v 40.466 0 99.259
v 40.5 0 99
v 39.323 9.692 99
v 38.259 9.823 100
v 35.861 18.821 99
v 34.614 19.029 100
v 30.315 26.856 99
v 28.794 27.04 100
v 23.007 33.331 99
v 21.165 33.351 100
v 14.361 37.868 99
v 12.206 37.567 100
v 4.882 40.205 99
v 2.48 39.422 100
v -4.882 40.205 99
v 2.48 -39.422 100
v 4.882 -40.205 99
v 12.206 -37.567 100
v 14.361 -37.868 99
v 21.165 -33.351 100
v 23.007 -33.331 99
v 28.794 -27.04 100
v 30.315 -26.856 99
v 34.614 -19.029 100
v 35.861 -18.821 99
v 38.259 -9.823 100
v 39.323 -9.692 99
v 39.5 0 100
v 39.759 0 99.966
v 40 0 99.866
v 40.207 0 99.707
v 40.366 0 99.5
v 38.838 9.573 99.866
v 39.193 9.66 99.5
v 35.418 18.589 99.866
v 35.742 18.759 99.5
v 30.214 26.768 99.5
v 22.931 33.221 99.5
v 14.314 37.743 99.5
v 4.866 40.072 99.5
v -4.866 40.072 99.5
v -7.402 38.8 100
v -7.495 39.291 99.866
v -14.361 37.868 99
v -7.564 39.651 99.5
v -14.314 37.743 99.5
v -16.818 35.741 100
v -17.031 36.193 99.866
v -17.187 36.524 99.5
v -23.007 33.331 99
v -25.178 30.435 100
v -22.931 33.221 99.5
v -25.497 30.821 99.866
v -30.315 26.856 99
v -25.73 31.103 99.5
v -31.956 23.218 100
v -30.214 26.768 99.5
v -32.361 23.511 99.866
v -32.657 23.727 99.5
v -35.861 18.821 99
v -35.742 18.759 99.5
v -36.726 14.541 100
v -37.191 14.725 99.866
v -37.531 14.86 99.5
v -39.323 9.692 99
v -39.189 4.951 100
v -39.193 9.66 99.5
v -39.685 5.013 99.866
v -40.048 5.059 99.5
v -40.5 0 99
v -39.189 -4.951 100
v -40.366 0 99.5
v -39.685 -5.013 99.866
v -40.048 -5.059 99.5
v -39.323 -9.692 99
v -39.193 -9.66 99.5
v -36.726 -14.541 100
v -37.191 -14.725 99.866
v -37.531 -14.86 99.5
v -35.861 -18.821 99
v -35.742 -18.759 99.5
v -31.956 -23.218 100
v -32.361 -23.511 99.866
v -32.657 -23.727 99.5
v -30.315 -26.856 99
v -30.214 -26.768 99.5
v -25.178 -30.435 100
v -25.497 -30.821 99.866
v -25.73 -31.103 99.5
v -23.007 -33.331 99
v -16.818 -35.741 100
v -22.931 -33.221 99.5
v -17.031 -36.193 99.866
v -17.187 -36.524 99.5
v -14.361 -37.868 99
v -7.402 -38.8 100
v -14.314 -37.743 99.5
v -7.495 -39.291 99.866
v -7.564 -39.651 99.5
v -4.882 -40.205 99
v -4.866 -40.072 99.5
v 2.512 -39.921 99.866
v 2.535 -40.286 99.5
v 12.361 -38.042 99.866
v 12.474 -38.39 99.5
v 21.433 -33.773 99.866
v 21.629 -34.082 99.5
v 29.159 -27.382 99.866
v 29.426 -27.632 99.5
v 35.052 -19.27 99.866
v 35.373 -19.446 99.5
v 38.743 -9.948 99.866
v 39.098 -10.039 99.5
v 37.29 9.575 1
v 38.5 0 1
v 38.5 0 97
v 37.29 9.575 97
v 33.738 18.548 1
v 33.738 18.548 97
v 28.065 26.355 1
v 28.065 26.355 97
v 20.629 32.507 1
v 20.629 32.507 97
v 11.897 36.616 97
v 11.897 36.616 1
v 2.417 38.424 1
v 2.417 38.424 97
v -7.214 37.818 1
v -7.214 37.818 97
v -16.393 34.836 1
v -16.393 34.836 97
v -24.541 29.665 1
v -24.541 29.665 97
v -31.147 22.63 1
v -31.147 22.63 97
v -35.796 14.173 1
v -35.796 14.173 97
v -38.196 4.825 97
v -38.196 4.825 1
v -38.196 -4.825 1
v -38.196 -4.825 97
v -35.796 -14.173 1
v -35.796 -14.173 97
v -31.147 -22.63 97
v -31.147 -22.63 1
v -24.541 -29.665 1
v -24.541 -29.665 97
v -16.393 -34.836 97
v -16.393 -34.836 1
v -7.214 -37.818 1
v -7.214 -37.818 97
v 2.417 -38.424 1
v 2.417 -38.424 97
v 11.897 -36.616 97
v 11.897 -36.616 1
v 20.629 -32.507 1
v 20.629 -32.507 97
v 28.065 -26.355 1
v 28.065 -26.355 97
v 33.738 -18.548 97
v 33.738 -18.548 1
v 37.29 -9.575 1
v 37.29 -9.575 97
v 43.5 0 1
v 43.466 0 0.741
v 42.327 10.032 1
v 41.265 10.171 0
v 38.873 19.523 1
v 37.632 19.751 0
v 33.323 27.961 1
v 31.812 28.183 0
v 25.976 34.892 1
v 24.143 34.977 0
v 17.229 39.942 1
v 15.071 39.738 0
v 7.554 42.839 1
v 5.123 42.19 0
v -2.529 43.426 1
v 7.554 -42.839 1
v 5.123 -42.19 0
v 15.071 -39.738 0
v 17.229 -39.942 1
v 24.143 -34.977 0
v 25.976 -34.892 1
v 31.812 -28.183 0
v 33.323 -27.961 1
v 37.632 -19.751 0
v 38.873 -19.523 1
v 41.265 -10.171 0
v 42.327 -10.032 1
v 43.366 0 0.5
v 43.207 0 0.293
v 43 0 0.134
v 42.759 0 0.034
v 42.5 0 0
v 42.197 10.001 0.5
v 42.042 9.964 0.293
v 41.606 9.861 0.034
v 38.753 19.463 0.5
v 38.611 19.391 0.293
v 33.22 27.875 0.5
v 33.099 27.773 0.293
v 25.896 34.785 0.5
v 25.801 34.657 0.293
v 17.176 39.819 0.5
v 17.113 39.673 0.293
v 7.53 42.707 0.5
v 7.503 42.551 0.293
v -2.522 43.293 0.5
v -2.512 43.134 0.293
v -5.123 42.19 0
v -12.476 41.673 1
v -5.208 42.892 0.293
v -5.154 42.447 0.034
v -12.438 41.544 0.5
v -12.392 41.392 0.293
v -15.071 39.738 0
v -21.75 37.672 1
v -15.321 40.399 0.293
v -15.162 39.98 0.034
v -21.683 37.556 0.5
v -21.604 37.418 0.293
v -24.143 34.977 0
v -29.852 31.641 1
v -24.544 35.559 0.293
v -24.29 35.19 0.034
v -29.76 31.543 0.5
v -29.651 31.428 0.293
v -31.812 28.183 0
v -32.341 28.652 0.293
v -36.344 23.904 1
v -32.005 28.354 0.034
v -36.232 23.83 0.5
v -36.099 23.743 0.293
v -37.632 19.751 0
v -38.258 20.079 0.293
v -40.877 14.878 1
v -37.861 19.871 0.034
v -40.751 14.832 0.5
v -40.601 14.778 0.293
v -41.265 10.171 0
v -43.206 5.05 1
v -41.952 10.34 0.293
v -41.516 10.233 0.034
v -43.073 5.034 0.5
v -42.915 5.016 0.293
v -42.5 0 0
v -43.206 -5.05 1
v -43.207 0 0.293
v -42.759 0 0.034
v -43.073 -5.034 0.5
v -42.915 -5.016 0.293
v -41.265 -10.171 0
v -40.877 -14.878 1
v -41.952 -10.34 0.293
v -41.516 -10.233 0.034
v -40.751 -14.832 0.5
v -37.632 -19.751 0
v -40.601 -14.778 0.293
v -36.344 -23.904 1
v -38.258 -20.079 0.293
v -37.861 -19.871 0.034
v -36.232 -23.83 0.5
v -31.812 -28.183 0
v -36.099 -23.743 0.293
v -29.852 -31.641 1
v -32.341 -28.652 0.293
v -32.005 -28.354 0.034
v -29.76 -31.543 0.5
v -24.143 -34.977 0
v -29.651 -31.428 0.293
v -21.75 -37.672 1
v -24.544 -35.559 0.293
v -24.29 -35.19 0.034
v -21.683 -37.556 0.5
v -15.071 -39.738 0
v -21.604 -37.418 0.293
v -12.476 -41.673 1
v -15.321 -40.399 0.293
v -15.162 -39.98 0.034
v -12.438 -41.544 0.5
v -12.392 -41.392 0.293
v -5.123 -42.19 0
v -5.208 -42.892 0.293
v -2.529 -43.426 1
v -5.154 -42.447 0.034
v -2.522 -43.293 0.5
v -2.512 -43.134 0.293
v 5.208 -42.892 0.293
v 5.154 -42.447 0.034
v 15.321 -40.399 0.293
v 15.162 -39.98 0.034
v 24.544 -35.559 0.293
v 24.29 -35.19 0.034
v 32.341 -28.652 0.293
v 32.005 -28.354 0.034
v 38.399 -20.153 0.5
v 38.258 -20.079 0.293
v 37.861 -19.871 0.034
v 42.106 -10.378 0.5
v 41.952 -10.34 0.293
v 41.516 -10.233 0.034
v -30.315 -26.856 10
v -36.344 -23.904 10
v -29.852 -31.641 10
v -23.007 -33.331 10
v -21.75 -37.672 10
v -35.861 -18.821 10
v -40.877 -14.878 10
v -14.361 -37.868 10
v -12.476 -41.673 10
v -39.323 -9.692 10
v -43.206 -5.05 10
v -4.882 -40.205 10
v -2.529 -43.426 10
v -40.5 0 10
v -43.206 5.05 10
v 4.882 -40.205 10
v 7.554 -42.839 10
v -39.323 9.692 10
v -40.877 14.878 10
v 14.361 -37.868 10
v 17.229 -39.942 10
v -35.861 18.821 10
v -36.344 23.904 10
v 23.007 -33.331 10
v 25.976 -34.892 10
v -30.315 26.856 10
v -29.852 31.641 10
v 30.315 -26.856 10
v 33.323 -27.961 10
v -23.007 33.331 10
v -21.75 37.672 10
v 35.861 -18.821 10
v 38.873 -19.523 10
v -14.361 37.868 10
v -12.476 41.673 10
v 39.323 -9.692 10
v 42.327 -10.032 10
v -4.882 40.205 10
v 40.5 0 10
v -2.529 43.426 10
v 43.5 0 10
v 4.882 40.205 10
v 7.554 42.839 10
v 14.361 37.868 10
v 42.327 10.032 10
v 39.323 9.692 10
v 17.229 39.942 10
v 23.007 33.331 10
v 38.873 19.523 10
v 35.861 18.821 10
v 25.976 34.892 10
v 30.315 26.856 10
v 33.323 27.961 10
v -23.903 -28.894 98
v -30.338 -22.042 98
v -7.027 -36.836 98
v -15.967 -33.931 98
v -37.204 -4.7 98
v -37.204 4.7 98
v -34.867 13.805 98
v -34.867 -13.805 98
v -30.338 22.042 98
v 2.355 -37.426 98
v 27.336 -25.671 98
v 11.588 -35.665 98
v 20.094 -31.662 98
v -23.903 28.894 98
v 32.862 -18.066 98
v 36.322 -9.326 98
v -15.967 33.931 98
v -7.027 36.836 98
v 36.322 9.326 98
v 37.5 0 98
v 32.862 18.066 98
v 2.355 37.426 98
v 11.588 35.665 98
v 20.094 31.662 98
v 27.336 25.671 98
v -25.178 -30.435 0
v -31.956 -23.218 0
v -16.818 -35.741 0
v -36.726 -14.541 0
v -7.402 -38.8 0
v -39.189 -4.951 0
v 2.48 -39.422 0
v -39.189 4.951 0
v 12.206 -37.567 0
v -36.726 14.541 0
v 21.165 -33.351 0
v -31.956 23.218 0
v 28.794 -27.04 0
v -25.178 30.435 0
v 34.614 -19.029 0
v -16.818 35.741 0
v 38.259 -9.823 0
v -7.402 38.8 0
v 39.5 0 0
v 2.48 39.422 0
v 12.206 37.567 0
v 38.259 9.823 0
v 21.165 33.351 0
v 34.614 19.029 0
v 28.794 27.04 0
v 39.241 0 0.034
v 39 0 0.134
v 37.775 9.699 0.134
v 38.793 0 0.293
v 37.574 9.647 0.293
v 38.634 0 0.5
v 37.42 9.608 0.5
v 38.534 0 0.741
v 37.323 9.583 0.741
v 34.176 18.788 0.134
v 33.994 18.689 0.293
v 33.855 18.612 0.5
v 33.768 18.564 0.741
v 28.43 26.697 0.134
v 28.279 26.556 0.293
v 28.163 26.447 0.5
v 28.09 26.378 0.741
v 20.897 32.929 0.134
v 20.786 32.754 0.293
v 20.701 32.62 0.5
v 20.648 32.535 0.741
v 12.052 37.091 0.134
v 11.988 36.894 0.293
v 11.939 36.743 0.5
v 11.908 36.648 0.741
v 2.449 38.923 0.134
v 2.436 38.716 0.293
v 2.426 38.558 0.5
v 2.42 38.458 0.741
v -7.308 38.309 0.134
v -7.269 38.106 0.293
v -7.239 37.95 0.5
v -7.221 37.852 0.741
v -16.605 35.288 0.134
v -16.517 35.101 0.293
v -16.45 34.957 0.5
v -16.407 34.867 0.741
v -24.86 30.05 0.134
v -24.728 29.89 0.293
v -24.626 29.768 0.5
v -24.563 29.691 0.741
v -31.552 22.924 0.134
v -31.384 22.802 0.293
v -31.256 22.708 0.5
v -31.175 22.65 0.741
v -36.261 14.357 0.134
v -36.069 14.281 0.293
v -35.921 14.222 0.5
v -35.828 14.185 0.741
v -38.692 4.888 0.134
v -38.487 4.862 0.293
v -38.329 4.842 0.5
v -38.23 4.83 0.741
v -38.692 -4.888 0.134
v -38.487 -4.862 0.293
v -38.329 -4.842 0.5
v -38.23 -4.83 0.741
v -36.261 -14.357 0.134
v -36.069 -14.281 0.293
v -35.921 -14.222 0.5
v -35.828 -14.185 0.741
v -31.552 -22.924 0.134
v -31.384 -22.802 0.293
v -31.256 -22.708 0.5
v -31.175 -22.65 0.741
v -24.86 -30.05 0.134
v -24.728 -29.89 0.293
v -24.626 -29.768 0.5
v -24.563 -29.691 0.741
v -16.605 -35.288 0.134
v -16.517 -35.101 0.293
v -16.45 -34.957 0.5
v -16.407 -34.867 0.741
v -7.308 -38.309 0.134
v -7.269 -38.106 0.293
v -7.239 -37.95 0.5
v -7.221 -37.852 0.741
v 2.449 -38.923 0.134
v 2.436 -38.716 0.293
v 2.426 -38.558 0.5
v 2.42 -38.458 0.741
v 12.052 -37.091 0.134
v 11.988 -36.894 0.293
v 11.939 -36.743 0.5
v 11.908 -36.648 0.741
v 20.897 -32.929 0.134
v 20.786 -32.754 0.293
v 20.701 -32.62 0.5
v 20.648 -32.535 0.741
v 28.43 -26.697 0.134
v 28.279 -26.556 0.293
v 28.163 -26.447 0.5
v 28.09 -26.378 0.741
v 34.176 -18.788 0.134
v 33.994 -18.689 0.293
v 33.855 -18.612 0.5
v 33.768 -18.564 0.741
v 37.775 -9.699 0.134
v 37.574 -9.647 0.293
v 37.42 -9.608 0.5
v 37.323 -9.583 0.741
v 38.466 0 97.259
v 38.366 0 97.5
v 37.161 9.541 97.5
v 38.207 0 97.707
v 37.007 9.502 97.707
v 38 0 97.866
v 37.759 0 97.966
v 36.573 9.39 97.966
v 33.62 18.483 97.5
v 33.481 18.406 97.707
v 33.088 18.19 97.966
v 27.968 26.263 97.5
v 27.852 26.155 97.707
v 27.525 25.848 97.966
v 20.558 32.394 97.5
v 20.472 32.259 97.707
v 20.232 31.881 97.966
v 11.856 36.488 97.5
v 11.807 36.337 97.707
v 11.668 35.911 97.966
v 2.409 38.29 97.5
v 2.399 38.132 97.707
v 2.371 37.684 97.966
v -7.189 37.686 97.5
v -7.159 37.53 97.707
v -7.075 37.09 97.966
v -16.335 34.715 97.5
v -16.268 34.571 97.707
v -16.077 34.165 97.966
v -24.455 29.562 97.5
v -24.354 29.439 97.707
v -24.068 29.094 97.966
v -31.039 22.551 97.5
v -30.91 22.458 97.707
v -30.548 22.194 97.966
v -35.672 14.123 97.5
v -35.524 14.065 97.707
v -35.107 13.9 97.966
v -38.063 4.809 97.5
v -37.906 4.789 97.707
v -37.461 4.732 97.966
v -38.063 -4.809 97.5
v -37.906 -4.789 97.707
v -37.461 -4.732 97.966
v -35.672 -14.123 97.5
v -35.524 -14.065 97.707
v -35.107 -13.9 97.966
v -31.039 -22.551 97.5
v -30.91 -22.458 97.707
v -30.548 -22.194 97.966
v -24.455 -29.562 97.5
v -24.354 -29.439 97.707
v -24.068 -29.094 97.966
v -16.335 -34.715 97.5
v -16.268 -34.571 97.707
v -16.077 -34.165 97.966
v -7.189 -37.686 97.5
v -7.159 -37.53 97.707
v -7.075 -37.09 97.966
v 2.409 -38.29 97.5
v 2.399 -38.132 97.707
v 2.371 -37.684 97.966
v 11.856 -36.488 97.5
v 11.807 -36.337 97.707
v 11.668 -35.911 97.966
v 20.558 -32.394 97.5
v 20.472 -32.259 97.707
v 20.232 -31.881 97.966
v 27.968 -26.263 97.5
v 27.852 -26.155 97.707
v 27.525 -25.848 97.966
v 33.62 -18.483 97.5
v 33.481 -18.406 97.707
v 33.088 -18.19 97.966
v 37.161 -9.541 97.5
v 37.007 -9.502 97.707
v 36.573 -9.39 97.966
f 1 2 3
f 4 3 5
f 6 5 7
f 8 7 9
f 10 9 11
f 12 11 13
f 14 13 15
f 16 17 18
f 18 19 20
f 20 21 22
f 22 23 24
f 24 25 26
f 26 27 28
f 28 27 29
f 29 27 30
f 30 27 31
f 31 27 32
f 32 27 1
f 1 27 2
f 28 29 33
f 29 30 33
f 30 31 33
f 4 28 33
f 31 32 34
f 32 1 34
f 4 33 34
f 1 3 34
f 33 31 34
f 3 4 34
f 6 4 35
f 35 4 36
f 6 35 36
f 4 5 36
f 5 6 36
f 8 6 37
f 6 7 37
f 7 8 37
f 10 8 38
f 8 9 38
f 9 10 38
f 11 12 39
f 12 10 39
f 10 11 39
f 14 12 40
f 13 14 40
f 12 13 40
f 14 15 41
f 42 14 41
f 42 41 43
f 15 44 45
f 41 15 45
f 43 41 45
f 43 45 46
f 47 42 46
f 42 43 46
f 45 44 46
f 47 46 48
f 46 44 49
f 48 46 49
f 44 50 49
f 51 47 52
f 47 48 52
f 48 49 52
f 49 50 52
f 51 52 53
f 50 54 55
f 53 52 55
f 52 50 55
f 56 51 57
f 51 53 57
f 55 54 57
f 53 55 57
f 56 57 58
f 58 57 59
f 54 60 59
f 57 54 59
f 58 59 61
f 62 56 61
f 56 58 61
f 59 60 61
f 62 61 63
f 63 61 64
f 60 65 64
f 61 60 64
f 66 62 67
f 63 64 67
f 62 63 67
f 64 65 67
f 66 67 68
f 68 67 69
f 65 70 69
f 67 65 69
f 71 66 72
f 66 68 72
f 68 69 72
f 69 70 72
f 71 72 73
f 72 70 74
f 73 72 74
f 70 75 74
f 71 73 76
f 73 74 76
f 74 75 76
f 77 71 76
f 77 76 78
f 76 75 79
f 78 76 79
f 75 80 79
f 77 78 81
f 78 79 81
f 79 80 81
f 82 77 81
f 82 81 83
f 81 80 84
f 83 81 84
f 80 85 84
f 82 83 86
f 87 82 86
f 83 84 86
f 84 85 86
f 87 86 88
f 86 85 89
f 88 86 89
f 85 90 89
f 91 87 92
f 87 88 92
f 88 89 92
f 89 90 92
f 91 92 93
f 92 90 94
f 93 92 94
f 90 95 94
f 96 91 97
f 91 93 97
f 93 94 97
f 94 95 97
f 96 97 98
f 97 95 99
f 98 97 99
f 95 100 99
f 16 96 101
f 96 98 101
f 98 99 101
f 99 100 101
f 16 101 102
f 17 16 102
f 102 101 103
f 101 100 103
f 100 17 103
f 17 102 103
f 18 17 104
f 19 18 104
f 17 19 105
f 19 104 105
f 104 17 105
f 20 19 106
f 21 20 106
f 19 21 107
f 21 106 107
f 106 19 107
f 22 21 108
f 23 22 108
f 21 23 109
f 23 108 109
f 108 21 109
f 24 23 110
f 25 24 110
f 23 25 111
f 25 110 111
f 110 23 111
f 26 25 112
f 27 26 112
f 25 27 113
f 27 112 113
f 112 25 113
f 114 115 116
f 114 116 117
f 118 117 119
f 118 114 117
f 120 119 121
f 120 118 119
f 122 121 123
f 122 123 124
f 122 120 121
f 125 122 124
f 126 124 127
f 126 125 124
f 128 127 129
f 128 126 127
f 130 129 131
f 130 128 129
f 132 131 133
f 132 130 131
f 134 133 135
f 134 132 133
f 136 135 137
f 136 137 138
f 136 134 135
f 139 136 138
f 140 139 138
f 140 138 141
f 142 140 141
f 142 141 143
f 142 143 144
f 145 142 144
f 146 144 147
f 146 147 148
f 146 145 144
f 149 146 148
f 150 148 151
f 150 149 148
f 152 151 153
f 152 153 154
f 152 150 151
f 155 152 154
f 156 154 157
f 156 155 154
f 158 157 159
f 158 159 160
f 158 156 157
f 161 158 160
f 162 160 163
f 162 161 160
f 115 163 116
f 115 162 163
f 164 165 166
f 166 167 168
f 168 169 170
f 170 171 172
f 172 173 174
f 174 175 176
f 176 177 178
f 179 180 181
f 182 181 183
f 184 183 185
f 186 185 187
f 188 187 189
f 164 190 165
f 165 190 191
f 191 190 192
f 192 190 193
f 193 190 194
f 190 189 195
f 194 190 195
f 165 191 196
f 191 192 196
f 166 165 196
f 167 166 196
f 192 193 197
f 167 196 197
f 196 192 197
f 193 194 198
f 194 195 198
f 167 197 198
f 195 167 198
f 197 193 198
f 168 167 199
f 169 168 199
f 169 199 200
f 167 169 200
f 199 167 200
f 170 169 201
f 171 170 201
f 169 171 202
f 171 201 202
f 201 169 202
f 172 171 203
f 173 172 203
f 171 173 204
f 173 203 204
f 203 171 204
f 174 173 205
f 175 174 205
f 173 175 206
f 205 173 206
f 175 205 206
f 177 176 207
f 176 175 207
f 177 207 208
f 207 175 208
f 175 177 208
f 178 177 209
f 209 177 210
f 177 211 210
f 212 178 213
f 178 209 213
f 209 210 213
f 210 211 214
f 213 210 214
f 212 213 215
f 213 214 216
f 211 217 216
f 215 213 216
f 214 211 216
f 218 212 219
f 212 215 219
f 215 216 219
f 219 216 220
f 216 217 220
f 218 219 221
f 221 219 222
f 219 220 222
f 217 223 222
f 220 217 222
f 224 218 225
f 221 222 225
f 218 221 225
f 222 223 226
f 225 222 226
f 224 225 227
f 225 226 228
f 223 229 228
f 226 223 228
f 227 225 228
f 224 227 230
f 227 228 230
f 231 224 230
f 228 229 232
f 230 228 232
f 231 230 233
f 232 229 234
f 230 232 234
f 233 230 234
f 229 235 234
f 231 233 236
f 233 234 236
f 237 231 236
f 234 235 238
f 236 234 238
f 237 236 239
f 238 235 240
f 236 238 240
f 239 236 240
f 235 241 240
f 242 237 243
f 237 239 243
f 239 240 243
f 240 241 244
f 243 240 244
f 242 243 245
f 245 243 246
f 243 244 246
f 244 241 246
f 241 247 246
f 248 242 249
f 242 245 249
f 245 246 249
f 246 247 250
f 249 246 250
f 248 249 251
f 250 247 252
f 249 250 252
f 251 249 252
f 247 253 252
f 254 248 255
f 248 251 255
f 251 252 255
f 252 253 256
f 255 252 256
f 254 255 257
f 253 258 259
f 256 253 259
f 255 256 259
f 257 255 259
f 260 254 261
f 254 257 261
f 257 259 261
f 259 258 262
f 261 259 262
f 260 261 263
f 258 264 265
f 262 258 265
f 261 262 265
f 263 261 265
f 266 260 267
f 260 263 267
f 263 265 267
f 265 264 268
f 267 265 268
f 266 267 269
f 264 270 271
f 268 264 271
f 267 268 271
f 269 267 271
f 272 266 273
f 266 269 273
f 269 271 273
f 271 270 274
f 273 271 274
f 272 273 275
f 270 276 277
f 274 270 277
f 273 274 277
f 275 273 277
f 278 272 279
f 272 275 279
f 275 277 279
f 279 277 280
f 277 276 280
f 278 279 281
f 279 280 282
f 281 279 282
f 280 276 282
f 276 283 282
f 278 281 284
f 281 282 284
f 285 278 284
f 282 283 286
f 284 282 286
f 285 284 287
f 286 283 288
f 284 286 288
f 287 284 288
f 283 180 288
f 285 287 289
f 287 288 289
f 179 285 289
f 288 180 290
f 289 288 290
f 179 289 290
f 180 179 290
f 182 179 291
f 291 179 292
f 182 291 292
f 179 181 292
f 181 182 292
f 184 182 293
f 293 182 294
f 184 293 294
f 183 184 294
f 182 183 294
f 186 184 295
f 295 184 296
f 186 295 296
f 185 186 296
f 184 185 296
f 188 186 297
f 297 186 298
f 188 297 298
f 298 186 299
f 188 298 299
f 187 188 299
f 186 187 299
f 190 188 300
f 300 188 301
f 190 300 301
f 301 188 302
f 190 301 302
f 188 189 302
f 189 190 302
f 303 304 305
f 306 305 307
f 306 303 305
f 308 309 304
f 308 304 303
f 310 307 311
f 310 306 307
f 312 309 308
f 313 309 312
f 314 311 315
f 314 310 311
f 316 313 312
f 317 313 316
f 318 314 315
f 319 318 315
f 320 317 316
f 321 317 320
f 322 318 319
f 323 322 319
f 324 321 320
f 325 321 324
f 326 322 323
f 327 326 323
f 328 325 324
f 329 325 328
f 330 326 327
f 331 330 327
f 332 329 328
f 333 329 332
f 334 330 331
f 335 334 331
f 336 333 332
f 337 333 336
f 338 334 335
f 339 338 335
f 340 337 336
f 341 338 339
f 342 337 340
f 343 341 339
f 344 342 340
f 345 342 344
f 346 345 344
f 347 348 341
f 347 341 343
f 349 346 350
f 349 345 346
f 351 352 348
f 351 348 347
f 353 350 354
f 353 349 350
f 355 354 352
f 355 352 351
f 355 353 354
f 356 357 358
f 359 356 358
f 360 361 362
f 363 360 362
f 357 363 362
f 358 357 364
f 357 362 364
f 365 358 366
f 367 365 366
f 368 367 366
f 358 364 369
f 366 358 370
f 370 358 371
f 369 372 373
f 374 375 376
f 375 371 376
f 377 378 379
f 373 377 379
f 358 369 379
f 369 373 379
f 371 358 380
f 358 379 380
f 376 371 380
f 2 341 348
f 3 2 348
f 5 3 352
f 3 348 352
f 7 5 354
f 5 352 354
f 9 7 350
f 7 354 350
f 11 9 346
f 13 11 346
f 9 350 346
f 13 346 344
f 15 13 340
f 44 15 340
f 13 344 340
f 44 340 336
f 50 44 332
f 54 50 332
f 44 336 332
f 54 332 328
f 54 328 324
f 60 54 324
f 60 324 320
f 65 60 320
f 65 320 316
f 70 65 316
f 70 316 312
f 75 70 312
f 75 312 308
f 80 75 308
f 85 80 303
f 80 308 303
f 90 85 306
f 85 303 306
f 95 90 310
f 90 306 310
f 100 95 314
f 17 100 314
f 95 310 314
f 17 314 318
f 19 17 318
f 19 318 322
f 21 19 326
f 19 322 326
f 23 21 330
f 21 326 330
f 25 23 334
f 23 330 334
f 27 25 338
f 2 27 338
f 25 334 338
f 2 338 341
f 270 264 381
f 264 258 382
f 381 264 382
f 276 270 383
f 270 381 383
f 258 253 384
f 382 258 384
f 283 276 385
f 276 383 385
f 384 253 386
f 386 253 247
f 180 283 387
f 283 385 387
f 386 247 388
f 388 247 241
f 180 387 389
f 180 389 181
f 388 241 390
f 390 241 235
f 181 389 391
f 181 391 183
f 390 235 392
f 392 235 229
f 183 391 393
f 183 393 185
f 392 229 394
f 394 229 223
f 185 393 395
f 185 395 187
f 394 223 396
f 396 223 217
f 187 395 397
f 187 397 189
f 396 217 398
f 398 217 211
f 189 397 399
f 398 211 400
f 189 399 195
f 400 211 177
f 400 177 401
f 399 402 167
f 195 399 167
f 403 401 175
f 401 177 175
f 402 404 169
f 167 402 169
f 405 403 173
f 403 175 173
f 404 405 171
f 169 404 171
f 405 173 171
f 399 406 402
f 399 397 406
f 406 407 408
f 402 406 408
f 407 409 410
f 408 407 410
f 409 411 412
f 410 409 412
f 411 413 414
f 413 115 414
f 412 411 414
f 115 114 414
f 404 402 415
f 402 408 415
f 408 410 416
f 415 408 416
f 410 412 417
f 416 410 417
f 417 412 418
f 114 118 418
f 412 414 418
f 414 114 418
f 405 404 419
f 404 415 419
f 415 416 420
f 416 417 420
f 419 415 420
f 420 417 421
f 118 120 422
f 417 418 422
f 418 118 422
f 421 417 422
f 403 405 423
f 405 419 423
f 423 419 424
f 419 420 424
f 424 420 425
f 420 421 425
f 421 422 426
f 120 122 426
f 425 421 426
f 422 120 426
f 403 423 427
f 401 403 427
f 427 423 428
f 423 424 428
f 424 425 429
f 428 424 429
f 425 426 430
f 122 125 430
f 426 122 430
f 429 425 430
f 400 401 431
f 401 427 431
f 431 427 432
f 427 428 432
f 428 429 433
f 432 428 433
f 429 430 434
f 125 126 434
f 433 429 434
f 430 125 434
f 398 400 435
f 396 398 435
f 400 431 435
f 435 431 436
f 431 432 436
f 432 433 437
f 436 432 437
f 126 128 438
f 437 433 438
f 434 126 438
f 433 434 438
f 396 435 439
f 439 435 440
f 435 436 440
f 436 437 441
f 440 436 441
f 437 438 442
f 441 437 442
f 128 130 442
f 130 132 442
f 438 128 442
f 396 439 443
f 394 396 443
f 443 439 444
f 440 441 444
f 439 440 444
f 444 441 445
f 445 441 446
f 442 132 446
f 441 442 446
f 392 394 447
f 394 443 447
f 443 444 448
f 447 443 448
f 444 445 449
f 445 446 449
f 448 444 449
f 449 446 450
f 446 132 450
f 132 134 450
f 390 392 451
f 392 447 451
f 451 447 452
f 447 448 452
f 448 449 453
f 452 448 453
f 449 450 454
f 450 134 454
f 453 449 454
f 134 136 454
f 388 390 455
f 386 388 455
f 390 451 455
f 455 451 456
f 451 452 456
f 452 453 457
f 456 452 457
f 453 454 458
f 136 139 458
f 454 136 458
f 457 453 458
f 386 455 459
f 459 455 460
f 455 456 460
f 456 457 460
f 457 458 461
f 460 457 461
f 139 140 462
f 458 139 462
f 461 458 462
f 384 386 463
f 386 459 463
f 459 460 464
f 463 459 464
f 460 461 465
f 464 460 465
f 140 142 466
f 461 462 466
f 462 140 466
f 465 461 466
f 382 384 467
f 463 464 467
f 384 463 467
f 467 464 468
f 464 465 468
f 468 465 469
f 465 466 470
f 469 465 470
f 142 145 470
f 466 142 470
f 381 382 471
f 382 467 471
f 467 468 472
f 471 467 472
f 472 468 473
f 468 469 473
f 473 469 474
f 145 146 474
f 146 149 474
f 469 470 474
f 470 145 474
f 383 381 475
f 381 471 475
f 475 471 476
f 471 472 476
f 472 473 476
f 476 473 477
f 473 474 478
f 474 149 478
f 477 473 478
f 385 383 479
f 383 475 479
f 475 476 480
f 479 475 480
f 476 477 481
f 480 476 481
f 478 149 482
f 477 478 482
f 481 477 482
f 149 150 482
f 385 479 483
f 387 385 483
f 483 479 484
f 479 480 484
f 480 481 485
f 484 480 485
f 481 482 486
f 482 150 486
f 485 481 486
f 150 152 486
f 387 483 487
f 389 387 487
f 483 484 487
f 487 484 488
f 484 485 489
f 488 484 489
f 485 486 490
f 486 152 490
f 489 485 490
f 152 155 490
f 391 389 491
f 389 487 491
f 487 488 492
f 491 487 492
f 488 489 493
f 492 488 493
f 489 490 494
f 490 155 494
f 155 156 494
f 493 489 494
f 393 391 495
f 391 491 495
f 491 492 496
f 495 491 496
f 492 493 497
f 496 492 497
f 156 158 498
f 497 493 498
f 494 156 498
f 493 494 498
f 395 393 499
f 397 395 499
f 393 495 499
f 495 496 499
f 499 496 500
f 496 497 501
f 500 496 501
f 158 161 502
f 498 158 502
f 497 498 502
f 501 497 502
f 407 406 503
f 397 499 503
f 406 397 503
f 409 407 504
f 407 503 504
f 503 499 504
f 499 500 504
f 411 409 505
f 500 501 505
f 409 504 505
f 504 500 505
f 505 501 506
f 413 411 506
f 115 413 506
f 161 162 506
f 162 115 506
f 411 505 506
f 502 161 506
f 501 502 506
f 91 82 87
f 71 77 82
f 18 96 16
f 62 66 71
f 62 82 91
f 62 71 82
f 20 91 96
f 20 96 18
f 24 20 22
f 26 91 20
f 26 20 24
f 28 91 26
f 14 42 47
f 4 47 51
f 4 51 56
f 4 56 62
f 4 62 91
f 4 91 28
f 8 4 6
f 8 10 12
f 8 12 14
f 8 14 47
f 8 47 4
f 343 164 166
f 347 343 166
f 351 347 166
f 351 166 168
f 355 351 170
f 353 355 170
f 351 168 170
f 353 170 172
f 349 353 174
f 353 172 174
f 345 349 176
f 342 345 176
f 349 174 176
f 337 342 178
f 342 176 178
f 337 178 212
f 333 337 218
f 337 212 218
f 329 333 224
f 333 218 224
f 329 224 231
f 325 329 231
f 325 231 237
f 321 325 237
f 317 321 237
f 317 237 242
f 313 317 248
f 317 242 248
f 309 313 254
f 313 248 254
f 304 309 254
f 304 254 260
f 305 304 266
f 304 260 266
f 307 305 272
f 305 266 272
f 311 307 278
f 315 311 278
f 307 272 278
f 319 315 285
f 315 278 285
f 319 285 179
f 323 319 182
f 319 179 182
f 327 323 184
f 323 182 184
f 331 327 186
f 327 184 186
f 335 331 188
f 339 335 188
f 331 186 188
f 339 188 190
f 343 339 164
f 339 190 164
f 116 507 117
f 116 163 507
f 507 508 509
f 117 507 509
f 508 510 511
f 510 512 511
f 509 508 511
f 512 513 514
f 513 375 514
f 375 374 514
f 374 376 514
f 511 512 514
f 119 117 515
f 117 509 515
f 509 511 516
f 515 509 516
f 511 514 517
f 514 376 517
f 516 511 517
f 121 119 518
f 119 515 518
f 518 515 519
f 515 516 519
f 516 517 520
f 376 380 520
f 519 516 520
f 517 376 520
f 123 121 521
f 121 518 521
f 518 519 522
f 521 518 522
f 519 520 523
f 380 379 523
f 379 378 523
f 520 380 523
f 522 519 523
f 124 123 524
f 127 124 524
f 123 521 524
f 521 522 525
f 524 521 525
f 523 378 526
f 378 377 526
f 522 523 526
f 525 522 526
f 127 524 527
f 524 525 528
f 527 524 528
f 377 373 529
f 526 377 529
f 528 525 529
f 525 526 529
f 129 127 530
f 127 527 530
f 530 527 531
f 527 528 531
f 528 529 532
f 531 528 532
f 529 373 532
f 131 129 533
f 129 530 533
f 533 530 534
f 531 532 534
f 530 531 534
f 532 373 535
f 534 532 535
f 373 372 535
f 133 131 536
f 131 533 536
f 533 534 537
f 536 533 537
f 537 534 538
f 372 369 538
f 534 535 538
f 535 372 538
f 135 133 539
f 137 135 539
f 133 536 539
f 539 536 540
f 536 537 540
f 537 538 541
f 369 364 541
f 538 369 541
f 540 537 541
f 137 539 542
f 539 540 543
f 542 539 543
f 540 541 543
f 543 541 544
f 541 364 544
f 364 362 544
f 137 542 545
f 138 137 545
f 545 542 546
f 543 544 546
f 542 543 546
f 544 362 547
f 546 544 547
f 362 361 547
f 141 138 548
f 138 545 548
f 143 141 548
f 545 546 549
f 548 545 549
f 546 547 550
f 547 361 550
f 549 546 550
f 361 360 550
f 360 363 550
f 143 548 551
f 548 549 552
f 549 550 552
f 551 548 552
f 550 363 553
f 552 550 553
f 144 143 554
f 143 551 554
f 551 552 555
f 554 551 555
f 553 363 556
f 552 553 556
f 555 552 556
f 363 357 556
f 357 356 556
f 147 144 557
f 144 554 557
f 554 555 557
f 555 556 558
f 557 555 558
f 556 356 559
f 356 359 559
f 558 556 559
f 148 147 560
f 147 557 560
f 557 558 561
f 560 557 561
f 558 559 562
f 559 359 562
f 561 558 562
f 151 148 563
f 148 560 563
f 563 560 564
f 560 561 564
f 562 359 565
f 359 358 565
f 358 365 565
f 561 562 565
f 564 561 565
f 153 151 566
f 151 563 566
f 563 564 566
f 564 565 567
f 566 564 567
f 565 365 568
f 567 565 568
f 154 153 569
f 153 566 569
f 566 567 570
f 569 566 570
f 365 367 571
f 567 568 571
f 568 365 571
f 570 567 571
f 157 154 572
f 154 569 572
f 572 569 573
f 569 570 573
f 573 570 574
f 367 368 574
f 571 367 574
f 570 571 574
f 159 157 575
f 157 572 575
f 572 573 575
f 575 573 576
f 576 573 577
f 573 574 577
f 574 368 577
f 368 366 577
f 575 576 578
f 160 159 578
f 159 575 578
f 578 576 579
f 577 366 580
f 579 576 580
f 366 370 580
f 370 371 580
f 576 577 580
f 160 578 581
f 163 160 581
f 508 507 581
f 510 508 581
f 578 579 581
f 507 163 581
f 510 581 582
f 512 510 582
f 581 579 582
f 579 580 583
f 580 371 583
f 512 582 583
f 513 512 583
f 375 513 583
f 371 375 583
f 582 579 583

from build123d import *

# Parameters (mm, degrees)
F0_R     = 43.5
F0_R_2   = 38.5
F1_DEPTH = 10
F2_R     = 40.5
F2_R_2   = 38.5
F3_DEPTH = 90
F4_R     = 38.5
F5_DEPTH = 2
F6_R     = 1


with BuildPart() as f1:
    # F0 (on Top) → F1 (new body)
    with BuildSketch(Plane.XY):
        Circle(F0_R)
        Circle(F0_R_2, mode=Mode.SUBTRACT)
    extrude(amount=F1_DEPTH)

    # F2 (on face) → F3 (join)
    with BuildSketch(Plane.XY.offset(10)):
        Circle(F2_R)
        Circle(F2_R_2, mode=Mode.SUBTRACT)
    extrude(amount=F3_DEPTH)

    # F4 (on face) → F5 (join)
    with BuildSketch(Plane.XY.offset(100)):
        Circle(F4_R)
    extrude(amount=-F5_DEPTH)

    # F6
    f6_edges = [f1.edges().sort_by_distance(p)[0] for p in [
        (-43.5, 0, 0),
        (-38.5, 0, 0),
        (-40.5, 0, 100),
        (-38.5, 0, 98),
    ]]
    fillet(f6_edges, radius=F6_R)


solid = f1.part
